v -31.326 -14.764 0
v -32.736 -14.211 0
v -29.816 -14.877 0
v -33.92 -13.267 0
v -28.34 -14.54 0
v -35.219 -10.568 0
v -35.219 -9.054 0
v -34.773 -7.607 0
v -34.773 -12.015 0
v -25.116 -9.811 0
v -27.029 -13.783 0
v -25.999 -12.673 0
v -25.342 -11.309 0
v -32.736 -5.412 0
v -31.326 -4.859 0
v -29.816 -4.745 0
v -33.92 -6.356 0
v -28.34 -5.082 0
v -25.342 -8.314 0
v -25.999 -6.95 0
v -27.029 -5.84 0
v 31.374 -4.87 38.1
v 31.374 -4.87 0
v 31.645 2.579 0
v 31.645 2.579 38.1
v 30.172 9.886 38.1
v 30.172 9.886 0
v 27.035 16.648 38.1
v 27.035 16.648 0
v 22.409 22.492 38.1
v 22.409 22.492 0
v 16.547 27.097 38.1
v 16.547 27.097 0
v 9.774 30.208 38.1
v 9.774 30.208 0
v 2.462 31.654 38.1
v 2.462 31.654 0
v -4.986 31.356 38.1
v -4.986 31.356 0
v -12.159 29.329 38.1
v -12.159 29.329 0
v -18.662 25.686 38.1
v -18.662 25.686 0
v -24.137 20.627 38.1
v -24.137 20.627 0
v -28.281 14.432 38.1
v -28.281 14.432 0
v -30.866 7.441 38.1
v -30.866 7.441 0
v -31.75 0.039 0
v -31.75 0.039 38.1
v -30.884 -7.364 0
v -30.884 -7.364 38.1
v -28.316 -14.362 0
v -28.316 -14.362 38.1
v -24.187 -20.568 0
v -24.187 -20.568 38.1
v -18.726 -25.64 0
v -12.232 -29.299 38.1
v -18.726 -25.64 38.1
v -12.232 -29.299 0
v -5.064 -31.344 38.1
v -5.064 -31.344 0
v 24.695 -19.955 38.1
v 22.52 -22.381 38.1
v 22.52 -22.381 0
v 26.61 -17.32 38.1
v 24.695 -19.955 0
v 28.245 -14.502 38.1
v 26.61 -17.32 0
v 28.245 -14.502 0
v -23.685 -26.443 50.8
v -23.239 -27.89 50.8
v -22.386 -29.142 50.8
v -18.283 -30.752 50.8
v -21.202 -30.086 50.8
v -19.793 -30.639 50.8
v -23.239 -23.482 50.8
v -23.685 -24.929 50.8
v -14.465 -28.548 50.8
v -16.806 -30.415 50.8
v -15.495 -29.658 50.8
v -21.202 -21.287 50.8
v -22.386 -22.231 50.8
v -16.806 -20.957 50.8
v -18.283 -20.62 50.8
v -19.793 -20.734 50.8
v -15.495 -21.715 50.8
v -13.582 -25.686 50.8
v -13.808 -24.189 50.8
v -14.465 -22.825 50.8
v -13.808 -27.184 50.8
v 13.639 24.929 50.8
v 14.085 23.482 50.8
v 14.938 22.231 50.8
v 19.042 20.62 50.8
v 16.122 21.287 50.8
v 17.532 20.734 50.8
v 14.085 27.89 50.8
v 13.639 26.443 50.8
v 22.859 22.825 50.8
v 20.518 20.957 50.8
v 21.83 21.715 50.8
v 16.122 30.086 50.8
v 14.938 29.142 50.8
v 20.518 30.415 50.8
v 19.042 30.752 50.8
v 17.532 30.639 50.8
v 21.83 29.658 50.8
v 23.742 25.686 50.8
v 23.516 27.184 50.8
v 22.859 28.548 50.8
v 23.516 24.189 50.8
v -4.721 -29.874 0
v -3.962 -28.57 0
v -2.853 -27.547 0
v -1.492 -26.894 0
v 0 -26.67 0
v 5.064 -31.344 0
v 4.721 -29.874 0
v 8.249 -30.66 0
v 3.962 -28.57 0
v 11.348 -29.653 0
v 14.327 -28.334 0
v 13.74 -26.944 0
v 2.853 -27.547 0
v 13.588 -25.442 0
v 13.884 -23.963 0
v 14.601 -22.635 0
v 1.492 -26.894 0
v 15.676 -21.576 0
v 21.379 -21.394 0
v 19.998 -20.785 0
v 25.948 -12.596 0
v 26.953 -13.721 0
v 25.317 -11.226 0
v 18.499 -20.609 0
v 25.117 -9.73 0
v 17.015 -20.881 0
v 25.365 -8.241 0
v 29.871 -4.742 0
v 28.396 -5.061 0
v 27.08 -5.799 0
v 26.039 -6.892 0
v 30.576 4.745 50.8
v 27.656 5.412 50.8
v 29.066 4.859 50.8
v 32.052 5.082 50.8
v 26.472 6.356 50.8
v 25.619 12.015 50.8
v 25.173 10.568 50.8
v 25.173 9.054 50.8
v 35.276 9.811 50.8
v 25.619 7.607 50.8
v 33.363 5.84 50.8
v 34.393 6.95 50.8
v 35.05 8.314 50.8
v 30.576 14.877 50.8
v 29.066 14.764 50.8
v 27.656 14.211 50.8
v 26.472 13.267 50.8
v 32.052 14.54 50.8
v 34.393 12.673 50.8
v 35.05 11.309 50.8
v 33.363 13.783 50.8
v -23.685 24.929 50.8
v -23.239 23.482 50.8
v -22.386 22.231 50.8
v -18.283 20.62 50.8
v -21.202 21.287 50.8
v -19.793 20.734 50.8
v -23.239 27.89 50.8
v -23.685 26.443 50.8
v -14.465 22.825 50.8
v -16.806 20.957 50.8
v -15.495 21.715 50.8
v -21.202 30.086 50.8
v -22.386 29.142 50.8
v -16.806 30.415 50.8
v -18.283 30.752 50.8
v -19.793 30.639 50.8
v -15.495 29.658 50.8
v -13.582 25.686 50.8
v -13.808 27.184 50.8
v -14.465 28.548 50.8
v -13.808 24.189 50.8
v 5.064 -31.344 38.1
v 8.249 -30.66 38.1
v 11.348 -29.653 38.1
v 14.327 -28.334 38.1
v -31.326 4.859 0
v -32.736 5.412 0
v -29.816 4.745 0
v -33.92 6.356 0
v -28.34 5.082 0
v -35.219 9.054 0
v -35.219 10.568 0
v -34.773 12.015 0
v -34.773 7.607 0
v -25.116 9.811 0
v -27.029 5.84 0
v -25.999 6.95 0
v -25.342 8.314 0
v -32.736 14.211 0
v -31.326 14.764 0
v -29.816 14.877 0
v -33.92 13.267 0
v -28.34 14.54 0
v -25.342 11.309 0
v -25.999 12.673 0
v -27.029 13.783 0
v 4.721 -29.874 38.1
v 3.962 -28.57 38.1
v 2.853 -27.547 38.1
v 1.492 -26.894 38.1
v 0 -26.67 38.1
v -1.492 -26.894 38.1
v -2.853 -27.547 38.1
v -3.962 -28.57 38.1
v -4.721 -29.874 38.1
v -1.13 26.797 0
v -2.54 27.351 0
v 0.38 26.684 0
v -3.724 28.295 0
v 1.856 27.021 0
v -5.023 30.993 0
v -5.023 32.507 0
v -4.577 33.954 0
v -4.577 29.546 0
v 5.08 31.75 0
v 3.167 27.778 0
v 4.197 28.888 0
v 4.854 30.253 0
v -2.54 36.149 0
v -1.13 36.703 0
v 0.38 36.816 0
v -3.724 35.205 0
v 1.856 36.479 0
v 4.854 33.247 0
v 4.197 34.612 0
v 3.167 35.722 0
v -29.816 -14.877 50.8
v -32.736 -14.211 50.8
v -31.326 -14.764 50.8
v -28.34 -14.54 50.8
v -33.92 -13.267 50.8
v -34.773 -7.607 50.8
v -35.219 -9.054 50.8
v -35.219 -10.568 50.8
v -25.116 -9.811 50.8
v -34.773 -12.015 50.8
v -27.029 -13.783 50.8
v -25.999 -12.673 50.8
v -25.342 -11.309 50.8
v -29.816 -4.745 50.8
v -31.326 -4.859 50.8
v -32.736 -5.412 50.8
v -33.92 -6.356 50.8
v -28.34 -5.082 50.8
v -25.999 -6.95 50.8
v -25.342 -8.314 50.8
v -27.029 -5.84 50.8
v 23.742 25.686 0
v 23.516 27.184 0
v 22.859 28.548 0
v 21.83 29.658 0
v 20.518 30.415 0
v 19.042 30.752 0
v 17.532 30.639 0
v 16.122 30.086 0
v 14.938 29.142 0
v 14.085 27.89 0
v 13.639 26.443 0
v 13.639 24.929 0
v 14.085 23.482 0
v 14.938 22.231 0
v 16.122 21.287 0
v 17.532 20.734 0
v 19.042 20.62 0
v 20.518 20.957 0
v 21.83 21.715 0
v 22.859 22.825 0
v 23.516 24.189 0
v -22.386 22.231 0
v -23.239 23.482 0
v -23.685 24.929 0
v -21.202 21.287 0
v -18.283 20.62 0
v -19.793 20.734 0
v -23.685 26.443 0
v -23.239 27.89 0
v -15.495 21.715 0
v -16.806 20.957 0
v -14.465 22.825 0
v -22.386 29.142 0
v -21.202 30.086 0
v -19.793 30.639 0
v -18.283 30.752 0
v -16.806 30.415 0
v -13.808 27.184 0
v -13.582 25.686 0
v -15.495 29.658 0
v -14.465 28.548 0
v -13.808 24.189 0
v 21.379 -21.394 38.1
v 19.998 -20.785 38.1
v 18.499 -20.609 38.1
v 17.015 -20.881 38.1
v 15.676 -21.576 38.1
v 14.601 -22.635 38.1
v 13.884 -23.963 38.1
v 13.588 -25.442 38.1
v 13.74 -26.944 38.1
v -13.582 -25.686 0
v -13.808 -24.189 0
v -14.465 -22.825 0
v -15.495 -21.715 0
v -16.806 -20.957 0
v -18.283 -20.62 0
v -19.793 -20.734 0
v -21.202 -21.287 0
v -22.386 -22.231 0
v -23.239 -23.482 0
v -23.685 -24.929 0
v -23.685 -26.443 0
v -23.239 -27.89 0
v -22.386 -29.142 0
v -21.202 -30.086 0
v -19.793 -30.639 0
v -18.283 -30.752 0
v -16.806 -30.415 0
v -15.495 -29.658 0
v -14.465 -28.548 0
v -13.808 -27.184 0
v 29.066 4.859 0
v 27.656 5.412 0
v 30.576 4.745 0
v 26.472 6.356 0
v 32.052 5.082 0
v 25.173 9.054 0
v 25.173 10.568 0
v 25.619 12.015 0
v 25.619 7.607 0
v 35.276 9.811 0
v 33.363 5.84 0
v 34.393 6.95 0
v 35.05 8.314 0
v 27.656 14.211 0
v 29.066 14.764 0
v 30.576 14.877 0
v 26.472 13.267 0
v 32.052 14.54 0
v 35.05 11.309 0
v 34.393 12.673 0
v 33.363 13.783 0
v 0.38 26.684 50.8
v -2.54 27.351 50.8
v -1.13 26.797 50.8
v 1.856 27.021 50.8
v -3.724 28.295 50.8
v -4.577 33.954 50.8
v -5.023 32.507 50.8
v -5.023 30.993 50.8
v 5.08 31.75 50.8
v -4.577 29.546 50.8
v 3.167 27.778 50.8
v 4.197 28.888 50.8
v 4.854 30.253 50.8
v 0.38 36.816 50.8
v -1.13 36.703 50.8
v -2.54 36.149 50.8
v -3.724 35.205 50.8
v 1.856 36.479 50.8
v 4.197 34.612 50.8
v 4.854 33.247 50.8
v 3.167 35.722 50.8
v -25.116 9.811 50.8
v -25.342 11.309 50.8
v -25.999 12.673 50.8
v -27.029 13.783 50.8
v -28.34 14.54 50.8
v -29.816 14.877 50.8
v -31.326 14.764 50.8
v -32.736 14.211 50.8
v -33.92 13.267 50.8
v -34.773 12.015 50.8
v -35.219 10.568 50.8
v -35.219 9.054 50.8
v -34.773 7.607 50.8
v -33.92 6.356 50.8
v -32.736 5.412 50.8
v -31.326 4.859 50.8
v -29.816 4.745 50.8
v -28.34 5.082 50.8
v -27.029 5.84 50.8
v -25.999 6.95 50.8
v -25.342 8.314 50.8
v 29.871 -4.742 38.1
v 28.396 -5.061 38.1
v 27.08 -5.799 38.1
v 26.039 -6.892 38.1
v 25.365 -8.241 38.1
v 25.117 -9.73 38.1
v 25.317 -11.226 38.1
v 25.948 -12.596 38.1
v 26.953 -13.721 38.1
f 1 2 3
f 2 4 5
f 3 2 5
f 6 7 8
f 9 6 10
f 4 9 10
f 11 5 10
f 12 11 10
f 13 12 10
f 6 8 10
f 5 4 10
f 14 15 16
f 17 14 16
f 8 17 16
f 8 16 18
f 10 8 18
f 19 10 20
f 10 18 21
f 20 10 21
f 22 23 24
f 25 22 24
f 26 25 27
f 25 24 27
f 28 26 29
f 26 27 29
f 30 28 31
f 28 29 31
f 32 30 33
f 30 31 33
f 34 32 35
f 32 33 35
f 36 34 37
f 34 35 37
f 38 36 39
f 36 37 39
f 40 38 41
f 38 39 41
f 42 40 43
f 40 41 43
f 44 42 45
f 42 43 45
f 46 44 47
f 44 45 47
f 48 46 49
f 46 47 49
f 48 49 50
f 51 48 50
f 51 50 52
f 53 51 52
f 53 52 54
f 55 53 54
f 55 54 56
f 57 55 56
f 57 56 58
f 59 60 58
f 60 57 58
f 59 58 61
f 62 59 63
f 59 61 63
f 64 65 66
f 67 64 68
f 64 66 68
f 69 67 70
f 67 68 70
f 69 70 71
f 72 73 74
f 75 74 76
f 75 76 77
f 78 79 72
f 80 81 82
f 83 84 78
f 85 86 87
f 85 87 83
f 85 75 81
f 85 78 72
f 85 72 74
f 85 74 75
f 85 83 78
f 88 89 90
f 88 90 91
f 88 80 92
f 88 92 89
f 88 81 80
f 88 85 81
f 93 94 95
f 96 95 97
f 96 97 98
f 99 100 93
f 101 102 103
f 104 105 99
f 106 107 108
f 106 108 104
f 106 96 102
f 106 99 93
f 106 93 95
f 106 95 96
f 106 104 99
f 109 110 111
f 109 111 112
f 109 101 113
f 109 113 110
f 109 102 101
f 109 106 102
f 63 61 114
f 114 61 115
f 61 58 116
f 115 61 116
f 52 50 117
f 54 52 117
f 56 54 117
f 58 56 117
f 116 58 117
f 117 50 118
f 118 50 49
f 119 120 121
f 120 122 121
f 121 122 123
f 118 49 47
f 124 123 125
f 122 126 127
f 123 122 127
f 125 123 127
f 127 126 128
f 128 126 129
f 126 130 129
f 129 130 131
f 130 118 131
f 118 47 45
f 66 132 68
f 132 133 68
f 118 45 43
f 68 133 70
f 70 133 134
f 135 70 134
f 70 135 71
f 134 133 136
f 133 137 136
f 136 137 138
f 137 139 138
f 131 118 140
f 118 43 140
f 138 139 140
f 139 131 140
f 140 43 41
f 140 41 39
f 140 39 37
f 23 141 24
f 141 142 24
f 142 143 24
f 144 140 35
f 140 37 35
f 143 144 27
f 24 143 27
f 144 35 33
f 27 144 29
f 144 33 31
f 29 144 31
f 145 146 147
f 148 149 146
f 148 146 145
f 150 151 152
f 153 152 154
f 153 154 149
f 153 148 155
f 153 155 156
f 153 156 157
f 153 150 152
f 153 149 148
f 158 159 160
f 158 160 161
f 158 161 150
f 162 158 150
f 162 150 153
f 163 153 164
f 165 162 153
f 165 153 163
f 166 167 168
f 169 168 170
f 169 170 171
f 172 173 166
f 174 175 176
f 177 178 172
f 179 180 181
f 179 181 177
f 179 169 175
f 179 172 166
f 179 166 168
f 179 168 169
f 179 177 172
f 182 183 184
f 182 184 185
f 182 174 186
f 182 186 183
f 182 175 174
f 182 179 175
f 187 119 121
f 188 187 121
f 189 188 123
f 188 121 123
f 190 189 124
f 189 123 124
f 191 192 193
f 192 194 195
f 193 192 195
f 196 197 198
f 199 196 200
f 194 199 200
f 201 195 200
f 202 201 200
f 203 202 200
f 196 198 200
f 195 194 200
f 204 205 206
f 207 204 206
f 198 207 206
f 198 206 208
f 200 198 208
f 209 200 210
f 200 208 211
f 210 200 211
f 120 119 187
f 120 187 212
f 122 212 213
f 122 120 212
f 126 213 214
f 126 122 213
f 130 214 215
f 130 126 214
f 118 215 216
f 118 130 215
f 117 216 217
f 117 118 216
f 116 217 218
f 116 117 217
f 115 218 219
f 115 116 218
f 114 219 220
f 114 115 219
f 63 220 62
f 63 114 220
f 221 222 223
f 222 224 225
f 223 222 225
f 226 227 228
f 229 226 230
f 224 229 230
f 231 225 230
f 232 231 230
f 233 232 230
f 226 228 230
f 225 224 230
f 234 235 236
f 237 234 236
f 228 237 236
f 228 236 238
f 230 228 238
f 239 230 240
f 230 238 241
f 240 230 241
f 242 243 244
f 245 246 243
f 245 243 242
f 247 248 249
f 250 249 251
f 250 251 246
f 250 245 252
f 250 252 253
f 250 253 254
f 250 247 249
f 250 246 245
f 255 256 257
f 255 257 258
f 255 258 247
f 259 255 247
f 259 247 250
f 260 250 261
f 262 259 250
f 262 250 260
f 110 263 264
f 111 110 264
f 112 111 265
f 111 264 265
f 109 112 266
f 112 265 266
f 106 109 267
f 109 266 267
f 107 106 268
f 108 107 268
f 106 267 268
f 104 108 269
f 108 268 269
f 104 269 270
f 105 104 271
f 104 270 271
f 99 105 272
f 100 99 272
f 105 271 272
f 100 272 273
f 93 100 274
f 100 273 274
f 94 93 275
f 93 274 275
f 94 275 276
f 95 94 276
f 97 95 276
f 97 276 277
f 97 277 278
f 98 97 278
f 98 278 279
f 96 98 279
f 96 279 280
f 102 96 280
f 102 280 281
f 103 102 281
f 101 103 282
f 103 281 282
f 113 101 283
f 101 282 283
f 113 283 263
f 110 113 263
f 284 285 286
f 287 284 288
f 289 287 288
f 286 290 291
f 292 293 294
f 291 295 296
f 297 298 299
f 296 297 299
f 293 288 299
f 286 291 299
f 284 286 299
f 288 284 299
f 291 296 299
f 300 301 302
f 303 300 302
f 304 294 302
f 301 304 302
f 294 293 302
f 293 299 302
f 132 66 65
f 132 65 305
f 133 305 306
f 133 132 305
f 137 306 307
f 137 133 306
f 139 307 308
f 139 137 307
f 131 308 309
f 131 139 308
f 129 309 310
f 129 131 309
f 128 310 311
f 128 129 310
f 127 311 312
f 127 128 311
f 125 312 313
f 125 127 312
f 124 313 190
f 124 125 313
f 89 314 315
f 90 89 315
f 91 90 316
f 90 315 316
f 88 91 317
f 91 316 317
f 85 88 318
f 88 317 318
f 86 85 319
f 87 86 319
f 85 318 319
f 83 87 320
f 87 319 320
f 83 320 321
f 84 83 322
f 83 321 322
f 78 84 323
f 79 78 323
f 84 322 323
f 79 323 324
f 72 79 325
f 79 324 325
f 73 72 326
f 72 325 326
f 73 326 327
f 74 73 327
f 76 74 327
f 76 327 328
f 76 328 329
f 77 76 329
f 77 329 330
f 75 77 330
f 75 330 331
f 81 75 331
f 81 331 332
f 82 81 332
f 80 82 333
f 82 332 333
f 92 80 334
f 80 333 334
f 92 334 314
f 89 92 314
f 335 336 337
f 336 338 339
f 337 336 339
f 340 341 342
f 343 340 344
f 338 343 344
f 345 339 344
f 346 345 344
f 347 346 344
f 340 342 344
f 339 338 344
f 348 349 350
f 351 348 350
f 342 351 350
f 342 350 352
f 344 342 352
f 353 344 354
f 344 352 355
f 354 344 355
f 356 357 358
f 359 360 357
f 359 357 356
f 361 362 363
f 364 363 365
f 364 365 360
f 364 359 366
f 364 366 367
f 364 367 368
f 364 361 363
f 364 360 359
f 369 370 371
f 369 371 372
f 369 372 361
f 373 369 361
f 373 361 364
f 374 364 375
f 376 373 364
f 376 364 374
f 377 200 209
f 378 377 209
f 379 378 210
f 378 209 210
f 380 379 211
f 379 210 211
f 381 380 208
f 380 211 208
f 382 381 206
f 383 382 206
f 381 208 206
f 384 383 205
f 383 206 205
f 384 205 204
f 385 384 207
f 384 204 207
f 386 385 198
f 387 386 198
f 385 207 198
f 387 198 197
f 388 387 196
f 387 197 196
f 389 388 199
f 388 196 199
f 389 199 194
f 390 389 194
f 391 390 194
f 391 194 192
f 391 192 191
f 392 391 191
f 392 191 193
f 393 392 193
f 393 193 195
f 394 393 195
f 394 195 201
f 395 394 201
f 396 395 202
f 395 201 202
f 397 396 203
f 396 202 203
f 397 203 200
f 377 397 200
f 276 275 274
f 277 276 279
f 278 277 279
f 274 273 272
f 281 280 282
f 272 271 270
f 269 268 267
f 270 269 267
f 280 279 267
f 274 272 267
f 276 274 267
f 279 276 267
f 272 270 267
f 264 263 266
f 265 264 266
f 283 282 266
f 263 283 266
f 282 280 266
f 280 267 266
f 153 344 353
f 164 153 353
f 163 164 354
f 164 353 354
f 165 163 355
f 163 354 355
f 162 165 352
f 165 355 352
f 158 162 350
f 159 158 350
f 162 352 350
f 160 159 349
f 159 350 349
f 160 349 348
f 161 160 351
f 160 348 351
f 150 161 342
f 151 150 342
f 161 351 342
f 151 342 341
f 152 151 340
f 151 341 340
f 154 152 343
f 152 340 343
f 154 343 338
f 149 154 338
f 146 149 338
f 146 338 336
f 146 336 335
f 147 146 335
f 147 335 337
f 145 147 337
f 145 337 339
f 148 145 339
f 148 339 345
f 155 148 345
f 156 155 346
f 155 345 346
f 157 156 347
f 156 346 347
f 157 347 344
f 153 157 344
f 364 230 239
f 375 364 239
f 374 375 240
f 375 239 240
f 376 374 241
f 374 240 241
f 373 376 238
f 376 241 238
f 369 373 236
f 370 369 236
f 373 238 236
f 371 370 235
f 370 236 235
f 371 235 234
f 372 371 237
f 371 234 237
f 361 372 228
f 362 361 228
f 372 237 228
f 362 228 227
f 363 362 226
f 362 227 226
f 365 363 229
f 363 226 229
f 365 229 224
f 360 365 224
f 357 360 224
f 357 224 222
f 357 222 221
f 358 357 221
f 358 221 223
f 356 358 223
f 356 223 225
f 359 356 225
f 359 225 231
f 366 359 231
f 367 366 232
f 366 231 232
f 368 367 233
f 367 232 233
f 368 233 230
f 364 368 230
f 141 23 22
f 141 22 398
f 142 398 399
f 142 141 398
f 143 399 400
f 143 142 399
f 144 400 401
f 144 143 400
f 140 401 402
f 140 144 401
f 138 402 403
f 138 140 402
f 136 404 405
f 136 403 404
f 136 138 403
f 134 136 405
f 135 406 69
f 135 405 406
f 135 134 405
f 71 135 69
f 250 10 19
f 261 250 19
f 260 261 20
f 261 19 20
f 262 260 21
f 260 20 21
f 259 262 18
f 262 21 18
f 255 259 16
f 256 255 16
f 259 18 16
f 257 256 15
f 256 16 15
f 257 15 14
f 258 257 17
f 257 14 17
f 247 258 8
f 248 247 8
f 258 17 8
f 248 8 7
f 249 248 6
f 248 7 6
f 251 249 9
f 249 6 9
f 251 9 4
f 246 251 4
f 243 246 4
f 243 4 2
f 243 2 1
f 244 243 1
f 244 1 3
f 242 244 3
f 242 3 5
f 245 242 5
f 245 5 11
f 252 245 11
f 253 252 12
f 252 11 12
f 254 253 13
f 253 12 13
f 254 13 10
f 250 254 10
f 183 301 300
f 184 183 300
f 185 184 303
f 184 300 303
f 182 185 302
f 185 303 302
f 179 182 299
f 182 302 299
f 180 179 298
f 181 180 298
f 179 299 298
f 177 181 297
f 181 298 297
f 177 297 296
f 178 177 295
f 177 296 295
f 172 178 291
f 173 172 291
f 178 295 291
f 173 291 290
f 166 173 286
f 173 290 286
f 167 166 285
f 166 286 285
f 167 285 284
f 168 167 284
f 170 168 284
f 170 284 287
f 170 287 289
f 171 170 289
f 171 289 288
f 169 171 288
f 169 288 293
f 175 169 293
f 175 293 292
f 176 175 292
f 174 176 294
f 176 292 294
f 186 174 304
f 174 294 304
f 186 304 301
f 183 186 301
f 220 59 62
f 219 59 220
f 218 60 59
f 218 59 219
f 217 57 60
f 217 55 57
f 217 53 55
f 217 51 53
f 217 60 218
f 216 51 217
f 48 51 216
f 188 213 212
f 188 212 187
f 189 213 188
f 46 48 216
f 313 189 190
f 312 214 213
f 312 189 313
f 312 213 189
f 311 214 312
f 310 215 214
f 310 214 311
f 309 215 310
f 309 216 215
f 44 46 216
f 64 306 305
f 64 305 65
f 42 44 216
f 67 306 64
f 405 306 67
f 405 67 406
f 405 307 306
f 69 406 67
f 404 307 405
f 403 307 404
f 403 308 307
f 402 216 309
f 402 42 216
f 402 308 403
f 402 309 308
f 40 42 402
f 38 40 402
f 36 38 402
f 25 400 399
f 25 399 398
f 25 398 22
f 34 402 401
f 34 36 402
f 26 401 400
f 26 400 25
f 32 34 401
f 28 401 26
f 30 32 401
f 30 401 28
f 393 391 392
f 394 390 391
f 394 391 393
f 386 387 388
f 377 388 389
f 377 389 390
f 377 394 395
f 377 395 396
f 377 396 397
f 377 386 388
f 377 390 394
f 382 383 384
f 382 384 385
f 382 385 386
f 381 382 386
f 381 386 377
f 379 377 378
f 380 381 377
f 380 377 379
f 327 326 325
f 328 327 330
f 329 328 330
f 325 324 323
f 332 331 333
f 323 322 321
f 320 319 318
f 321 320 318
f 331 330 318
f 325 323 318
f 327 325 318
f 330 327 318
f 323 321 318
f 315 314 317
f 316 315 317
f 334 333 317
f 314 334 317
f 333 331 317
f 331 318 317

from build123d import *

# Parameters (mm, degrees)
F0_R     = 31.75
F1_DEPTH = 38.1
F2_R     = 5.08
F3_DEPTH = 50.8


with BuildPart() as f1:
    # F0 (on Top) → F1 (new body)
    with BuildSketch(Plane.XY):
        Circle(F0_R)
    extrude(amount=F1_DEPTH)


with BuildPart() as f3:
    # F2 (on Top) → F3 (new body)
    with BuildSketch(Plane.XY):
        with Locations((0, 31.75)):
            Circle(F2_R)
    extrude(amount=F3_DEPTH)


with BuildPart() as f3b:
    # F2 (on Top) → F3, piece 2 (new body)
    with BuildSketch(Plane.XY):
        with Locations((-18.6621817603, 25.6862895714)):
            Circle(F2_R)
    extrude(amount=F3_DEPTH)


with BuildPart() as f3c:
    # F2 (on Top) → F3, piece 3 (new body)
    with BuildSketch(Plane.XY):
        with Locations((-30.1960443924, 9.8112895714)):
            Circle(F2_R)
    extrude(amount=F3_DEPTH)


with BuildPart() as f3d:
    # F2 (on Top) → F3, piece 4 (new body)
    with BuildSketch(Plane.XY):
        with Locations((-30.1960443924, -9.8112895714)):
            Circle(F2_R)
    extrude(amount=F3_DEPTH)


with BuildPart() as f3e:
    # F2 (on Top) → F3, piece 5 (new body)
    with BuildSketch(Plane.XY):
        with Locations((-18.6621817603, -25.6862895714)):
            Circle(F2_R)
    extrude(amount=F3_DEPTH)


with BuildPart() as f3f:
    # F2 (on Top) → F3, piece 6 (new body)
    with BuildSketch(Plane.XY):
        with Locations((0, -31.75)):
            Circle(F2_R)
    extrude(amount=F3_DEPTH)


with BuildPart() as f3g:
    # F2 (on Top) → F3, piece 7 (new body)
    with BuildSketch(Plane.XY):
        with Locations((18.6621817603, -25.6862895714)):
            Circle(F2_R)
    extrude(amount=F3_DEPTH)


with BuildPart() as f3h:
    # F2 (on Top) → F3, piece 8 (new body)
    with BuildSketch(Plane.XY):
        with Locations((30.1960443924, -9.8112895714)):
            Circle(F2_R)
    extrude(amount=F3_DEPTH)


with BuildPart() as f3i:
    # F2 (on Top) → F3, piece 9 (new body)
    with BuildSketch(Plane.XY):
        with Locations((30.1960443924, 9.8112895714)):
            Circle(F2_R)
    extrude(amount=F3_DEPTH)


with BuildPart() as f3j:
    # F2 (on Top) → F3, piece 10 (new body)
    with BuildSketch(Plane.XY):
        with Locations((18.6621817603, 25.6862895714)):
            Circle(F2_R)
    extrude(amount=F3_DEPTH)


with BuildPart() as f1_1:
    add(f1.part)

    # F4: cut F3h, F3g, F3f
    add(f3h.part, mode=Mode.SUBTRACT)
    add(f3g.part, mode=Mode.SUBTRACT)
    add(f3f.part, mode=Mode.SUBTRACT)


solid = Compound([f3.part, f3b.part, f3c.part, f3d.part, f3e.part, f3i.part, f3j.part, f1_1.part])
